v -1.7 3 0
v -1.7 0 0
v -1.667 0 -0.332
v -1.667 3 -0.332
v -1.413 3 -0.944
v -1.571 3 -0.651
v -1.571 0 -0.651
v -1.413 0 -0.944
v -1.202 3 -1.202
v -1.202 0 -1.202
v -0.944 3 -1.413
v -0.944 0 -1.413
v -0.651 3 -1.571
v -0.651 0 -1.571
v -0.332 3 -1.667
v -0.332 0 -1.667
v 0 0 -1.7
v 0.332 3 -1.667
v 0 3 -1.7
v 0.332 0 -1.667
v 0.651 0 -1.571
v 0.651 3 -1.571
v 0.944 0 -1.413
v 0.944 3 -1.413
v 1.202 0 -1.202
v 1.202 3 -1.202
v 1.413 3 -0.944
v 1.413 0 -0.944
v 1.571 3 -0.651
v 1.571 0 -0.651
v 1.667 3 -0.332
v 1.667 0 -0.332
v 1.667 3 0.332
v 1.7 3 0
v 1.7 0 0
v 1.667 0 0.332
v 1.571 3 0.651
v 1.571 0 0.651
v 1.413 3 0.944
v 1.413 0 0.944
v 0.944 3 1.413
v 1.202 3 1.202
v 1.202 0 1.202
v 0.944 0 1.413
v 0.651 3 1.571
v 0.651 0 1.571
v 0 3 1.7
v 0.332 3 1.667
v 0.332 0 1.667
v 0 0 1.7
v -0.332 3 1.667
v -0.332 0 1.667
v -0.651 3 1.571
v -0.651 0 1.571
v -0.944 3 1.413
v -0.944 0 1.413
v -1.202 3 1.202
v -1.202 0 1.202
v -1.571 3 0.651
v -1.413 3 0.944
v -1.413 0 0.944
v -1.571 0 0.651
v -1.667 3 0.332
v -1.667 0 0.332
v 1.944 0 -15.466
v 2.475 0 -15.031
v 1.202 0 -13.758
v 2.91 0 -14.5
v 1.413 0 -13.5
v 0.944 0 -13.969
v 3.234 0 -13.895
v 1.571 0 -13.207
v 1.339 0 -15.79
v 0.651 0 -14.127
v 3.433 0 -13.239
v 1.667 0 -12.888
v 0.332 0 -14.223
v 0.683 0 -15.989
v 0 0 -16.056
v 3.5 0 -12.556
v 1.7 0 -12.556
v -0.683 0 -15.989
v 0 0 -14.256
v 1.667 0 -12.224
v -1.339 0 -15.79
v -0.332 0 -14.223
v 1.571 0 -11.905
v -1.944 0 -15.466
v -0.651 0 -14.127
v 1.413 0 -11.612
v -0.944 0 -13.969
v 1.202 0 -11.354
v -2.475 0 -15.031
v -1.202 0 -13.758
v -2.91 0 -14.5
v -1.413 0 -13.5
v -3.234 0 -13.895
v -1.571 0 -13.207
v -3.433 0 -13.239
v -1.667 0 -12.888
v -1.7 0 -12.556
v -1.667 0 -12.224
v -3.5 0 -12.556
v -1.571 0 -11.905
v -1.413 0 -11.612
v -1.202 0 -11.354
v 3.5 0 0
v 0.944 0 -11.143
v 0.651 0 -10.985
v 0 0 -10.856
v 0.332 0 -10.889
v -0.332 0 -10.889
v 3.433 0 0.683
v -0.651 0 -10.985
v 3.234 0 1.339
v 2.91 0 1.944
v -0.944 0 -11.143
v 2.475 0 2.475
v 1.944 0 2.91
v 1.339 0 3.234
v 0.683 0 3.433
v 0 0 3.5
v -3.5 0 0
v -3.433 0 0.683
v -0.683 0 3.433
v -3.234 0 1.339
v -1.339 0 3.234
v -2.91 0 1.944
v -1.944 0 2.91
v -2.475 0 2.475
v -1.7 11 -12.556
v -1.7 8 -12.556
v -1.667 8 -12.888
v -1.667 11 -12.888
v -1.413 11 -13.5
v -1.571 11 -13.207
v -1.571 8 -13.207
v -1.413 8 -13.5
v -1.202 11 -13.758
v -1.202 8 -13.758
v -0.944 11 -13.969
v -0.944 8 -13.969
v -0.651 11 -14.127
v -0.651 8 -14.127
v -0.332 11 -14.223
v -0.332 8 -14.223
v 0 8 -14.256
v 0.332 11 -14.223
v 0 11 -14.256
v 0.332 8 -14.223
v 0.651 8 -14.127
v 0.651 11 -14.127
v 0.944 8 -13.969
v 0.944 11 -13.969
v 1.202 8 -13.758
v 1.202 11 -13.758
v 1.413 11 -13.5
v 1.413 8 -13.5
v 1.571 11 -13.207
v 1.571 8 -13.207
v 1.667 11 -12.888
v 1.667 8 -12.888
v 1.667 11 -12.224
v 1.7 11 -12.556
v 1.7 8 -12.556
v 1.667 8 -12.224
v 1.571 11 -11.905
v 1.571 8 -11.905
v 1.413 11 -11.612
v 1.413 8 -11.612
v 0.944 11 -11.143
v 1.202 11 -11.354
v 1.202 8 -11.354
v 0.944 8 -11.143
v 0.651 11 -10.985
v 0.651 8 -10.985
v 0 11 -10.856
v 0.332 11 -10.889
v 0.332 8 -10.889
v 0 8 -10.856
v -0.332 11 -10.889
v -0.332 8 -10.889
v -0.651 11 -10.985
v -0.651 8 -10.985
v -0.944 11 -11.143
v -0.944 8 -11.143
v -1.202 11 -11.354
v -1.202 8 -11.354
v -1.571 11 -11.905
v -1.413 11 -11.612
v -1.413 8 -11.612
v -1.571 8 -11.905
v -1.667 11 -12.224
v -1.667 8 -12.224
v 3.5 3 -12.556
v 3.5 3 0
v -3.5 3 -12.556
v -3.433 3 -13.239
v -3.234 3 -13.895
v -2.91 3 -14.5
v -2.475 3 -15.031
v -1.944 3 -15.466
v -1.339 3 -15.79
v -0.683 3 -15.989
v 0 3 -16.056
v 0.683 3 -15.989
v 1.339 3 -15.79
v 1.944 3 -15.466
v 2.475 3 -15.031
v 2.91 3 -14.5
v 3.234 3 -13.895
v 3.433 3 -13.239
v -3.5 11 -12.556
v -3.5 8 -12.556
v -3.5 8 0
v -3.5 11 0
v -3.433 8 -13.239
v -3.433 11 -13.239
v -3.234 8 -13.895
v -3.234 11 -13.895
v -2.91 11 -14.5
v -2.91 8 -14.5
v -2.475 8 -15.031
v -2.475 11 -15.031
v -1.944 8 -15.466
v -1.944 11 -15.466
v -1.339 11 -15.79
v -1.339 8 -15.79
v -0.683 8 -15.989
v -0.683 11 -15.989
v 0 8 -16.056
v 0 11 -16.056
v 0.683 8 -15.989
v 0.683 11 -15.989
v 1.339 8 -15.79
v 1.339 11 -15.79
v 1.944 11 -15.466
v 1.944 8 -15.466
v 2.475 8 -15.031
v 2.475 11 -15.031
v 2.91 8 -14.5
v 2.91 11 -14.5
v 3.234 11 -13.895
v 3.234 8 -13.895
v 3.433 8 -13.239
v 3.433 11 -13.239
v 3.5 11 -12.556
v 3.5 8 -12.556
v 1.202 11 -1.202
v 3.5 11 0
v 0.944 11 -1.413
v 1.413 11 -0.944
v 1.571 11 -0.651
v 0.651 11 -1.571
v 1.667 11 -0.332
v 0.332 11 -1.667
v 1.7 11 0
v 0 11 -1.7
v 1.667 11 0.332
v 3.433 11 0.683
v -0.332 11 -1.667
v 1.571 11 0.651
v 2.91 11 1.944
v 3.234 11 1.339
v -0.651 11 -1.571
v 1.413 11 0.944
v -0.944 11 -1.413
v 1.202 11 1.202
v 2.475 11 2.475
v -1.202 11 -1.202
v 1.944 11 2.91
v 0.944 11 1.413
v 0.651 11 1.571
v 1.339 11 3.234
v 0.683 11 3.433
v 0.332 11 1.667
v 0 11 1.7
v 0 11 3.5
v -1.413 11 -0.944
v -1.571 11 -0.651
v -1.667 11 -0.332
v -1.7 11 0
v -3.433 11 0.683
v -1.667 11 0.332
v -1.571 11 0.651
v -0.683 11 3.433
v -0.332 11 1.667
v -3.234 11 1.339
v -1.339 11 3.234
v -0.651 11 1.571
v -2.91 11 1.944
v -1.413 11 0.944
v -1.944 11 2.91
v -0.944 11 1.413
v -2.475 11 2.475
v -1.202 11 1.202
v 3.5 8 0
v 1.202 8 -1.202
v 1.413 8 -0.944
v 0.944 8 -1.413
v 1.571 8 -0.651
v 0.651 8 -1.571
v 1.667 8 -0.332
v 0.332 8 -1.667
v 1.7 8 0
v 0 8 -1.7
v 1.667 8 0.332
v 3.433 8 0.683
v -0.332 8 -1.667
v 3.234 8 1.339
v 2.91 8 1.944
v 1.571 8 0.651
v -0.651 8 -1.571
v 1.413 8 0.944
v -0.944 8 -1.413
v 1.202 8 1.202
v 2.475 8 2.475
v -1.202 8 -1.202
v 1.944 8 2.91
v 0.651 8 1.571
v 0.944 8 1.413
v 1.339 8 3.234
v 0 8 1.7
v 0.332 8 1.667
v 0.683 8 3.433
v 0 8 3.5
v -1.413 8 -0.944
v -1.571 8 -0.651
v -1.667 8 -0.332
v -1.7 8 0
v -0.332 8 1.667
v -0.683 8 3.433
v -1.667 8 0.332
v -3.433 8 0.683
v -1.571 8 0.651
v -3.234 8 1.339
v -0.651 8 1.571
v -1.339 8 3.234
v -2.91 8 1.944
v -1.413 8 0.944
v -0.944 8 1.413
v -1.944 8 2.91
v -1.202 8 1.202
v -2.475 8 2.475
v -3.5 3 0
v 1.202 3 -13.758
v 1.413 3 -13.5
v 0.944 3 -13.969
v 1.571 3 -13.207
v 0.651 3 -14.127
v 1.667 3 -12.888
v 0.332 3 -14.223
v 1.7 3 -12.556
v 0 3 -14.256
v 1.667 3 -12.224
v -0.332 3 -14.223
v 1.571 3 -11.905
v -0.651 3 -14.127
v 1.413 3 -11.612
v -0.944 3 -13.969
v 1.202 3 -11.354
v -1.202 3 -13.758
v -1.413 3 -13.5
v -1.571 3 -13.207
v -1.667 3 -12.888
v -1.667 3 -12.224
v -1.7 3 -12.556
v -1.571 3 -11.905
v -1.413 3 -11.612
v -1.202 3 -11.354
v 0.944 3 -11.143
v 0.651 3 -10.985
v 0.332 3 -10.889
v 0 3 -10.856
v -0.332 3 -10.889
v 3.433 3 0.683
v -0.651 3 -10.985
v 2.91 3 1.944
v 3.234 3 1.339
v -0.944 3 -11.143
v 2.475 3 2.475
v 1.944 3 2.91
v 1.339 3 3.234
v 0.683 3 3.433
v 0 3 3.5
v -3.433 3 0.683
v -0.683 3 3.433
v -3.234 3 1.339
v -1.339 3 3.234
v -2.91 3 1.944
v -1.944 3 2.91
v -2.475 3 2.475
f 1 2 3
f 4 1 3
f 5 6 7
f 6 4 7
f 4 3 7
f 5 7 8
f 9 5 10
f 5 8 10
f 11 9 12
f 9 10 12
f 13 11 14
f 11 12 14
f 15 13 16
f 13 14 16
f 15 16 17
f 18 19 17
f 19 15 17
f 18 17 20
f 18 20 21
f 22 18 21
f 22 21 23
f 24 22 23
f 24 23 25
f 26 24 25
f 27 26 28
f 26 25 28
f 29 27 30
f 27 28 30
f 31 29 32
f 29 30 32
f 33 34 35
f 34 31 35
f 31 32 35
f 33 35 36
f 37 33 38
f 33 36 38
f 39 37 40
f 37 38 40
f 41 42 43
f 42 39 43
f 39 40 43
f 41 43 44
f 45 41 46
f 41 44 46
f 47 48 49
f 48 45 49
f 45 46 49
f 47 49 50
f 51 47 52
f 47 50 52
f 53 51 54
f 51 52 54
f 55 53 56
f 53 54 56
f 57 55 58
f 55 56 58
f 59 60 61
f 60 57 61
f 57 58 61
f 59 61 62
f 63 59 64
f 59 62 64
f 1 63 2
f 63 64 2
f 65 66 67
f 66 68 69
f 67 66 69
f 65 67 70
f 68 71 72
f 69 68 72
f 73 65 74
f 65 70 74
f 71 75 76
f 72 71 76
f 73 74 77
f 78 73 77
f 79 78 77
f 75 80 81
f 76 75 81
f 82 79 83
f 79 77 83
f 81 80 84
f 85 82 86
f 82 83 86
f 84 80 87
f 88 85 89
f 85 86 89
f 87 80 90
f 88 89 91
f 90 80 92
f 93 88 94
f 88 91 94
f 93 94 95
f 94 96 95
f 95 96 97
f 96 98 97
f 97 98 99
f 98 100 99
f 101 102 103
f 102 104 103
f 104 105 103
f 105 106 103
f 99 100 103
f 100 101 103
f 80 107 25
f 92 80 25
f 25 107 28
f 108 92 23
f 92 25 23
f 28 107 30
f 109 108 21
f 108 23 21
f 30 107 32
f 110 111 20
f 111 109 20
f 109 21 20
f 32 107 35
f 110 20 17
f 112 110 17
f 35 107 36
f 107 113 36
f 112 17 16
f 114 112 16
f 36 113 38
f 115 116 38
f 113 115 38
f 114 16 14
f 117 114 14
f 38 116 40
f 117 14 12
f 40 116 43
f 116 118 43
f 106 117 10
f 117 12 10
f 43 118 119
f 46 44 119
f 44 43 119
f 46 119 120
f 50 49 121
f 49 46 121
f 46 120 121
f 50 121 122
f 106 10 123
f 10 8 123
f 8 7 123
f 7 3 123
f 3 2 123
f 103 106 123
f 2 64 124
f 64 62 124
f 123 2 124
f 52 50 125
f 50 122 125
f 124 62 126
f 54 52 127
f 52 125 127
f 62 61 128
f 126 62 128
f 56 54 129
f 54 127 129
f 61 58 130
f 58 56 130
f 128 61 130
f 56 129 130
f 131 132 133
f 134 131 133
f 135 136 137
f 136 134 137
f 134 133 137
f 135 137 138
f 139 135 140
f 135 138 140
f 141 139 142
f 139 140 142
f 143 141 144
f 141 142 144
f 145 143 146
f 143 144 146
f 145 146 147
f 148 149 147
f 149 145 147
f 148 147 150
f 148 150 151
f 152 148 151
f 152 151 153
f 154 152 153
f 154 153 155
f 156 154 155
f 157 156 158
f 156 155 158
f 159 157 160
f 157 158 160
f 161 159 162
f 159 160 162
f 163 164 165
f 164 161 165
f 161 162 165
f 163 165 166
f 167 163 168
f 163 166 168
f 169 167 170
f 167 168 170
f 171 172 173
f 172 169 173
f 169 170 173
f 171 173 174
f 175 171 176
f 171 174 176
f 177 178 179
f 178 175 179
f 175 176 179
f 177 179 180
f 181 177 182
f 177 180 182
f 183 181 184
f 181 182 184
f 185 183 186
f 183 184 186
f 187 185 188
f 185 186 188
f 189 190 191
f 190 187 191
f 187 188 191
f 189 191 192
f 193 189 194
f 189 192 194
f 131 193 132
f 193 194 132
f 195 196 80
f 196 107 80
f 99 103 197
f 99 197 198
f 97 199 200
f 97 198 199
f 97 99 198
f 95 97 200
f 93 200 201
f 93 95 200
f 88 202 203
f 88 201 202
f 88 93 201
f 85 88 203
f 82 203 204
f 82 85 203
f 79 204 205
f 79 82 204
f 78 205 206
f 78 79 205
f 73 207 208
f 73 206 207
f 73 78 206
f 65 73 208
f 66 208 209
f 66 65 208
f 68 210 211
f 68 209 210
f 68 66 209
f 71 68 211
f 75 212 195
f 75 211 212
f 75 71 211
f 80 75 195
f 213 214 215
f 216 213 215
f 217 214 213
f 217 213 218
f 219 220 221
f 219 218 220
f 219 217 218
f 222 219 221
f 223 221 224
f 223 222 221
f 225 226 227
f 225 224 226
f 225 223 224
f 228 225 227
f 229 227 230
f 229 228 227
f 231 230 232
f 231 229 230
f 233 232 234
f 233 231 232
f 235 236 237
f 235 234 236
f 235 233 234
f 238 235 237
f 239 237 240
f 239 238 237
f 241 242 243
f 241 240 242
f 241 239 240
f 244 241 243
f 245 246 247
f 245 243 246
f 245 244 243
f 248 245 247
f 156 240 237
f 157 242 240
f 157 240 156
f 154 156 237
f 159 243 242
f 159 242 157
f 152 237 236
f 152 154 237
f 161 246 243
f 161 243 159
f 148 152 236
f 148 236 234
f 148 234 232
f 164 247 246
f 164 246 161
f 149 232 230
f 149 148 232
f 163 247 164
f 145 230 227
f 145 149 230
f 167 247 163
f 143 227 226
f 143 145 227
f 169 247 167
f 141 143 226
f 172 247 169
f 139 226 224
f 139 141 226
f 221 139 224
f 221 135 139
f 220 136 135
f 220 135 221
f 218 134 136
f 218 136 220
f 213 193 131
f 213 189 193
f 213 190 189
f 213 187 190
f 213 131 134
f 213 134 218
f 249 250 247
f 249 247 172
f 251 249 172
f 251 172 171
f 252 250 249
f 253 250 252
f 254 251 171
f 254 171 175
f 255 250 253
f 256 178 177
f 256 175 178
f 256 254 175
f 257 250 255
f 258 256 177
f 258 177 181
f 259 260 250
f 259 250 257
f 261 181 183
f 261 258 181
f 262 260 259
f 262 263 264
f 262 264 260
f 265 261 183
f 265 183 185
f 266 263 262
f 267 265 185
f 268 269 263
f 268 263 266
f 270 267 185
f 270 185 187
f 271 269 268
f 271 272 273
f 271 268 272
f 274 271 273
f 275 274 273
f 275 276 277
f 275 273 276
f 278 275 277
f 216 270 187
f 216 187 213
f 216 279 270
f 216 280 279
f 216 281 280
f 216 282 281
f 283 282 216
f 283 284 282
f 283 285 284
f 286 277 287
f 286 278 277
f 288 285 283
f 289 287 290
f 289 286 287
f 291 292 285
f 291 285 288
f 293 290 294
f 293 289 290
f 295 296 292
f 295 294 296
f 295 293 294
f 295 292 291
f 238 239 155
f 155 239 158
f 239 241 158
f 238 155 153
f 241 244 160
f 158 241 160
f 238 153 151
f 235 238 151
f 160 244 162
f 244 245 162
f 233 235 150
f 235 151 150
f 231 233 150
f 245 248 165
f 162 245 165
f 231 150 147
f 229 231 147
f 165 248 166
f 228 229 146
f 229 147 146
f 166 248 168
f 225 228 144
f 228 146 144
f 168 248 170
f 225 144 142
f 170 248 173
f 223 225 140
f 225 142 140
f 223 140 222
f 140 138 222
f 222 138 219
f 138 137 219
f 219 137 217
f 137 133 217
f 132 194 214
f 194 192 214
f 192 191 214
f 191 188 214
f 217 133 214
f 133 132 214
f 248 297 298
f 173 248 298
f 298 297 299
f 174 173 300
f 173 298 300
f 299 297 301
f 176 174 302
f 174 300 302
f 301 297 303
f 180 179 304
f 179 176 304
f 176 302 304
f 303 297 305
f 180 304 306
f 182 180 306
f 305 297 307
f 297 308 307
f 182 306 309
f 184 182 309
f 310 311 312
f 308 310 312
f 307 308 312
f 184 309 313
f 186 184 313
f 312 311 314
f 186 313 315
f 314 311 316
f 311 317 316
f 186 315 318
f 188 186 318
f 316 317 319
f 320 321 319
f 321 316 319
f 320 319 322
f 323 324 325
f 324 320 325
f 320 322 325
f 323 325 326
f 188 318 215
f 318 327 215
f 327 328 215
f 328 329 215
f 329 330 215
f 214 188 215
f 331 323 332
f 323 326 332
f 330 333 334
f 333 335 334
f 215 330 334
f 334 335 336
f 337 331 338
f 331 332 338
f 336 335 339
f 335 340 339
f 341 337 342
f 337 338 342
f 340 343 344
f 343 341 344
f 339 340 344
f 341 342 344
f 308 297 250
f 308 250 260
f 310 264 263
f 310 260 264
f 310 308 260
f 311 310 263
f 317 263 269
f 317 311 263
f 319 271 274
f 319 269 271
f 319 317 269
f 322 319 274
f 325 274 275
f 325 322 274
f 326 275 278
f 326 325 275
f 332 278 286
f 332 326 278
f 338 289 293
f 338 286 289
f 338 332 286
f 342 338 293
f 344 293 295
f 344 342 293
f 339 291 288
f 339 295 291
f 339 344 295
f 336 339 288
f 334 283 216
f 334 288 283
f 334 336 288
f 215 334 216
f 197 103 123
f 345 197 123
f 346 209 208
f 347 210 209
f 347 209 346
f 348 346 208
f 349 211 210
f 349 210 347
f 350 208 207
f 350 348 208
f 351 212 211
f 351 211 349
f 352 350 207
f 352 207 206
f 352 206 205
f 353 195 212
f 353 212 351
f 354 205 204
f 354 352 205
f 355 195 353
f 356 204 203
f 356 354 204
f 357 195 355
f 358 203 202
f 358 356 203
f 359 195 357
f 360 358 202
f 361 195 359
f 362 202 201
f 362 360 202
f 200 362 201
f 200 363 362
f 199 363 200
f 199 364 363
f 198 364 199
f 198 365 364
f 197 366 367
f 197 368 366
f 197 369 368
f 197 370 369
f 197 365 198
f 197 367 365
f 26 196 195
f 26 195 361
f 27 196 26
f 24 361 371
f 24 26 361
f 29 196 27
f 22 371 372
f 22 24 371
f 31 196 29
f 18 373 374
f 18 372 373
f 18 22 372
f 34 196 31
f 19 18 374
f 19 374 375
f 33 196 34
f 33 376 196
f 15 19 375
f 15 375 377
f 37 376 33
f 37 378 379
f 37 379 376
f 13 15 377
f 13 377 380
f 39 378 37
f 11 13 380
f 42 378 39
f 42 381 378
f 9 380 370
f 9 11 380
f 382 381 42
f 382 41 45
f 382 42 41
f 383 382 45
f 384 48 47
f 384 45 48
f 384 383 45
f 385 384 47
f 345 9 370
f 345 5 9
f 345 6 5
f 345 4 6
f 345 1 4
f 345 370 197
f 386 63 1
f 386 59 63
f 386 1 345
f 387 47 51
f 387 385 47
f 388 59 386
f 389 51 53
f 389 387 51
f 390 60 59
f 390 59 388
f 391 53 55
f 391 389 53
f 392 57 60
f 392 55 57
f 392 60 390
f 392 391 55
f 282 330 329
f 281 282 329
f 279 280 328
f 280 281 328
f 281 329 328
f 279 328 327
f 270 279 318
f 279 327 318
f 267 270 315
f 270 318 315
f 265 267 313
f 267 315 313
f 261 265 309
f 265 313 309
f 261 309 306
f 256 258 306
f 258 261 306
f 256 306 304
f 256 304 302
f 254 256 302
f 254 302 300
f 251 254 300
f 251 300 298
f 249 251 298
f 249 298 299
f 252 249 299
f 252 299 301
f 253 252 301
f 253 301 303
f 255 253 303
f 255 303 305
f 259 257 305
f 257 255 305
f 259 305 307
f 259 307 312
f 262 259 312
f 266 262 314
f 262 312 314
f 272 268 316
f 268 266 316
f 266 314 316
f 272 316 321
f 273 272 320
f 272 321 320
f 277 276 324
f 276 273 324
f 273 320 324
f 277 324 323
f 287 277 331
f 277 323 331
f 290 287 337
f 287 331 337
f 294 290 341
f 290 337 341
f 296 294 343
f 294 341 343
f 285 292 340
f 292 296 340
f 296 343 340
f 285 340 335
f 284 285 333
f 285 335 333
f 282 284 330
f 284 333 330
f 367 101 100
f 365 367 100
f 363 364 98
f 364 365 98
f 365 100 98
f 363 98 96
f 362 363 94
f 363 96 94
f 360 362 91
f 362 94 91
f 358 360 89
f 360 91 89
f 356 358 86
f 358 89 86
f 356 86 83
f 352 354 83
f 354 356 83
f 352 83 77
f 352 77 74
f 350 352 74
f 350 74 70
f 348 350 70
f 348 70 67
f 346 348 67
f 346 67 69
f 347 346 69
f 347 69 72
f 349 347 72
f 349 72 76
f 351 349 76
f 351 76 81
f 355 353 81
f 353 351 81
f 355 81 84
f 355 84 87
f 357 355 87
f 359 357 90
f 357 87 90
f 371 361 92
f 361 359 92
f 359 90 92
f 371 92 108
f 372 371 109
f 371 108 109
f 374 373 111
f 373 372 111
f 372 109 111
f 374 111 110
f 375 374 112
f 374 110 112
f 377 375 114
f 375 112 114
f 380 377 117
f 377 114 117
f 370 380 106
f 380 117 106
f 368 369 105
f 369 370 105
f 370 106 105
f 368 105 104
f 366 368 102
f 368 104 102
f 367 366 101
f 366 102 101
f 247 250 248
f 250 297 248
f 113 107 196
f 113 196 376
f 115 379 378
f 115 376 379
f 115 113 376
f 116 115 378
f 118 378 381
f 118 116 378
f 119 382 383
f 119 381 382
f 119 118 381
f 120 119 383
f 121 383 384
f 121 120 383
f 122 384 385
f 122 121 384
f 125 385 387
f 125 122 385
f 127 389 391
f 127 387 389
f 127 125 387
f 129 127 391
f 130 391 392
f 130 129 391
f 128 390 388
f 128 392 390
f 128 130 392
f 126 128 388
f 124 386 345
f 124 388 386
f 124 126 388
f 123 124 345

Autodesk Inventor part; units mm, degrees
ref_plane "YZ Plane" through (0, 0, 0) normal (1, 0, 0) x (0, 1, 0)
ref_plane "XZ Plane" through (0, 0, 0) normal (0, 1, 0) x (-1, 0, 0)
ref_plane "XY Plane" through (0, 0, 0) normal (0, 0, 1) x (1, 0, 0)
sketch "Sketch1" plane through (0, 0, 0) normal (0, 1, 0) x (-1, 0, 0)
  line L0 (0, 0) -> (0, -12.556) construction
  line L1 (-3.5, 0) -> (-3.5, -12.556)
  line L2 (3.5, -12.556) -> (3.5, 0)
  arc A0 (3.5, 0) -> (-3.5, 0) centre (0, 0) ccw
  arc A1 (-3.5, -12.556) -> (3.5, -12.556) centre (0, -12.556) ccw
  circle A2 centre (0, 0) radius 1.7
  circle A3 centre (0, -12.556) radius 1.7
  point P0 (0, -6.278)
  dimension "d0" = 7
  dimension "d1" = 3.4
  dimension "d2" = 3.4
  dimension "d3" = 12.556
extrude "Extrusion1" add sketch "Sketch1" along normal blind 3
pattern_linear "Rectangular Pattern1" count 2 spacing 8 along (0, 1, 0) of "Extrusion1"
properties part number "Corredera_III"
